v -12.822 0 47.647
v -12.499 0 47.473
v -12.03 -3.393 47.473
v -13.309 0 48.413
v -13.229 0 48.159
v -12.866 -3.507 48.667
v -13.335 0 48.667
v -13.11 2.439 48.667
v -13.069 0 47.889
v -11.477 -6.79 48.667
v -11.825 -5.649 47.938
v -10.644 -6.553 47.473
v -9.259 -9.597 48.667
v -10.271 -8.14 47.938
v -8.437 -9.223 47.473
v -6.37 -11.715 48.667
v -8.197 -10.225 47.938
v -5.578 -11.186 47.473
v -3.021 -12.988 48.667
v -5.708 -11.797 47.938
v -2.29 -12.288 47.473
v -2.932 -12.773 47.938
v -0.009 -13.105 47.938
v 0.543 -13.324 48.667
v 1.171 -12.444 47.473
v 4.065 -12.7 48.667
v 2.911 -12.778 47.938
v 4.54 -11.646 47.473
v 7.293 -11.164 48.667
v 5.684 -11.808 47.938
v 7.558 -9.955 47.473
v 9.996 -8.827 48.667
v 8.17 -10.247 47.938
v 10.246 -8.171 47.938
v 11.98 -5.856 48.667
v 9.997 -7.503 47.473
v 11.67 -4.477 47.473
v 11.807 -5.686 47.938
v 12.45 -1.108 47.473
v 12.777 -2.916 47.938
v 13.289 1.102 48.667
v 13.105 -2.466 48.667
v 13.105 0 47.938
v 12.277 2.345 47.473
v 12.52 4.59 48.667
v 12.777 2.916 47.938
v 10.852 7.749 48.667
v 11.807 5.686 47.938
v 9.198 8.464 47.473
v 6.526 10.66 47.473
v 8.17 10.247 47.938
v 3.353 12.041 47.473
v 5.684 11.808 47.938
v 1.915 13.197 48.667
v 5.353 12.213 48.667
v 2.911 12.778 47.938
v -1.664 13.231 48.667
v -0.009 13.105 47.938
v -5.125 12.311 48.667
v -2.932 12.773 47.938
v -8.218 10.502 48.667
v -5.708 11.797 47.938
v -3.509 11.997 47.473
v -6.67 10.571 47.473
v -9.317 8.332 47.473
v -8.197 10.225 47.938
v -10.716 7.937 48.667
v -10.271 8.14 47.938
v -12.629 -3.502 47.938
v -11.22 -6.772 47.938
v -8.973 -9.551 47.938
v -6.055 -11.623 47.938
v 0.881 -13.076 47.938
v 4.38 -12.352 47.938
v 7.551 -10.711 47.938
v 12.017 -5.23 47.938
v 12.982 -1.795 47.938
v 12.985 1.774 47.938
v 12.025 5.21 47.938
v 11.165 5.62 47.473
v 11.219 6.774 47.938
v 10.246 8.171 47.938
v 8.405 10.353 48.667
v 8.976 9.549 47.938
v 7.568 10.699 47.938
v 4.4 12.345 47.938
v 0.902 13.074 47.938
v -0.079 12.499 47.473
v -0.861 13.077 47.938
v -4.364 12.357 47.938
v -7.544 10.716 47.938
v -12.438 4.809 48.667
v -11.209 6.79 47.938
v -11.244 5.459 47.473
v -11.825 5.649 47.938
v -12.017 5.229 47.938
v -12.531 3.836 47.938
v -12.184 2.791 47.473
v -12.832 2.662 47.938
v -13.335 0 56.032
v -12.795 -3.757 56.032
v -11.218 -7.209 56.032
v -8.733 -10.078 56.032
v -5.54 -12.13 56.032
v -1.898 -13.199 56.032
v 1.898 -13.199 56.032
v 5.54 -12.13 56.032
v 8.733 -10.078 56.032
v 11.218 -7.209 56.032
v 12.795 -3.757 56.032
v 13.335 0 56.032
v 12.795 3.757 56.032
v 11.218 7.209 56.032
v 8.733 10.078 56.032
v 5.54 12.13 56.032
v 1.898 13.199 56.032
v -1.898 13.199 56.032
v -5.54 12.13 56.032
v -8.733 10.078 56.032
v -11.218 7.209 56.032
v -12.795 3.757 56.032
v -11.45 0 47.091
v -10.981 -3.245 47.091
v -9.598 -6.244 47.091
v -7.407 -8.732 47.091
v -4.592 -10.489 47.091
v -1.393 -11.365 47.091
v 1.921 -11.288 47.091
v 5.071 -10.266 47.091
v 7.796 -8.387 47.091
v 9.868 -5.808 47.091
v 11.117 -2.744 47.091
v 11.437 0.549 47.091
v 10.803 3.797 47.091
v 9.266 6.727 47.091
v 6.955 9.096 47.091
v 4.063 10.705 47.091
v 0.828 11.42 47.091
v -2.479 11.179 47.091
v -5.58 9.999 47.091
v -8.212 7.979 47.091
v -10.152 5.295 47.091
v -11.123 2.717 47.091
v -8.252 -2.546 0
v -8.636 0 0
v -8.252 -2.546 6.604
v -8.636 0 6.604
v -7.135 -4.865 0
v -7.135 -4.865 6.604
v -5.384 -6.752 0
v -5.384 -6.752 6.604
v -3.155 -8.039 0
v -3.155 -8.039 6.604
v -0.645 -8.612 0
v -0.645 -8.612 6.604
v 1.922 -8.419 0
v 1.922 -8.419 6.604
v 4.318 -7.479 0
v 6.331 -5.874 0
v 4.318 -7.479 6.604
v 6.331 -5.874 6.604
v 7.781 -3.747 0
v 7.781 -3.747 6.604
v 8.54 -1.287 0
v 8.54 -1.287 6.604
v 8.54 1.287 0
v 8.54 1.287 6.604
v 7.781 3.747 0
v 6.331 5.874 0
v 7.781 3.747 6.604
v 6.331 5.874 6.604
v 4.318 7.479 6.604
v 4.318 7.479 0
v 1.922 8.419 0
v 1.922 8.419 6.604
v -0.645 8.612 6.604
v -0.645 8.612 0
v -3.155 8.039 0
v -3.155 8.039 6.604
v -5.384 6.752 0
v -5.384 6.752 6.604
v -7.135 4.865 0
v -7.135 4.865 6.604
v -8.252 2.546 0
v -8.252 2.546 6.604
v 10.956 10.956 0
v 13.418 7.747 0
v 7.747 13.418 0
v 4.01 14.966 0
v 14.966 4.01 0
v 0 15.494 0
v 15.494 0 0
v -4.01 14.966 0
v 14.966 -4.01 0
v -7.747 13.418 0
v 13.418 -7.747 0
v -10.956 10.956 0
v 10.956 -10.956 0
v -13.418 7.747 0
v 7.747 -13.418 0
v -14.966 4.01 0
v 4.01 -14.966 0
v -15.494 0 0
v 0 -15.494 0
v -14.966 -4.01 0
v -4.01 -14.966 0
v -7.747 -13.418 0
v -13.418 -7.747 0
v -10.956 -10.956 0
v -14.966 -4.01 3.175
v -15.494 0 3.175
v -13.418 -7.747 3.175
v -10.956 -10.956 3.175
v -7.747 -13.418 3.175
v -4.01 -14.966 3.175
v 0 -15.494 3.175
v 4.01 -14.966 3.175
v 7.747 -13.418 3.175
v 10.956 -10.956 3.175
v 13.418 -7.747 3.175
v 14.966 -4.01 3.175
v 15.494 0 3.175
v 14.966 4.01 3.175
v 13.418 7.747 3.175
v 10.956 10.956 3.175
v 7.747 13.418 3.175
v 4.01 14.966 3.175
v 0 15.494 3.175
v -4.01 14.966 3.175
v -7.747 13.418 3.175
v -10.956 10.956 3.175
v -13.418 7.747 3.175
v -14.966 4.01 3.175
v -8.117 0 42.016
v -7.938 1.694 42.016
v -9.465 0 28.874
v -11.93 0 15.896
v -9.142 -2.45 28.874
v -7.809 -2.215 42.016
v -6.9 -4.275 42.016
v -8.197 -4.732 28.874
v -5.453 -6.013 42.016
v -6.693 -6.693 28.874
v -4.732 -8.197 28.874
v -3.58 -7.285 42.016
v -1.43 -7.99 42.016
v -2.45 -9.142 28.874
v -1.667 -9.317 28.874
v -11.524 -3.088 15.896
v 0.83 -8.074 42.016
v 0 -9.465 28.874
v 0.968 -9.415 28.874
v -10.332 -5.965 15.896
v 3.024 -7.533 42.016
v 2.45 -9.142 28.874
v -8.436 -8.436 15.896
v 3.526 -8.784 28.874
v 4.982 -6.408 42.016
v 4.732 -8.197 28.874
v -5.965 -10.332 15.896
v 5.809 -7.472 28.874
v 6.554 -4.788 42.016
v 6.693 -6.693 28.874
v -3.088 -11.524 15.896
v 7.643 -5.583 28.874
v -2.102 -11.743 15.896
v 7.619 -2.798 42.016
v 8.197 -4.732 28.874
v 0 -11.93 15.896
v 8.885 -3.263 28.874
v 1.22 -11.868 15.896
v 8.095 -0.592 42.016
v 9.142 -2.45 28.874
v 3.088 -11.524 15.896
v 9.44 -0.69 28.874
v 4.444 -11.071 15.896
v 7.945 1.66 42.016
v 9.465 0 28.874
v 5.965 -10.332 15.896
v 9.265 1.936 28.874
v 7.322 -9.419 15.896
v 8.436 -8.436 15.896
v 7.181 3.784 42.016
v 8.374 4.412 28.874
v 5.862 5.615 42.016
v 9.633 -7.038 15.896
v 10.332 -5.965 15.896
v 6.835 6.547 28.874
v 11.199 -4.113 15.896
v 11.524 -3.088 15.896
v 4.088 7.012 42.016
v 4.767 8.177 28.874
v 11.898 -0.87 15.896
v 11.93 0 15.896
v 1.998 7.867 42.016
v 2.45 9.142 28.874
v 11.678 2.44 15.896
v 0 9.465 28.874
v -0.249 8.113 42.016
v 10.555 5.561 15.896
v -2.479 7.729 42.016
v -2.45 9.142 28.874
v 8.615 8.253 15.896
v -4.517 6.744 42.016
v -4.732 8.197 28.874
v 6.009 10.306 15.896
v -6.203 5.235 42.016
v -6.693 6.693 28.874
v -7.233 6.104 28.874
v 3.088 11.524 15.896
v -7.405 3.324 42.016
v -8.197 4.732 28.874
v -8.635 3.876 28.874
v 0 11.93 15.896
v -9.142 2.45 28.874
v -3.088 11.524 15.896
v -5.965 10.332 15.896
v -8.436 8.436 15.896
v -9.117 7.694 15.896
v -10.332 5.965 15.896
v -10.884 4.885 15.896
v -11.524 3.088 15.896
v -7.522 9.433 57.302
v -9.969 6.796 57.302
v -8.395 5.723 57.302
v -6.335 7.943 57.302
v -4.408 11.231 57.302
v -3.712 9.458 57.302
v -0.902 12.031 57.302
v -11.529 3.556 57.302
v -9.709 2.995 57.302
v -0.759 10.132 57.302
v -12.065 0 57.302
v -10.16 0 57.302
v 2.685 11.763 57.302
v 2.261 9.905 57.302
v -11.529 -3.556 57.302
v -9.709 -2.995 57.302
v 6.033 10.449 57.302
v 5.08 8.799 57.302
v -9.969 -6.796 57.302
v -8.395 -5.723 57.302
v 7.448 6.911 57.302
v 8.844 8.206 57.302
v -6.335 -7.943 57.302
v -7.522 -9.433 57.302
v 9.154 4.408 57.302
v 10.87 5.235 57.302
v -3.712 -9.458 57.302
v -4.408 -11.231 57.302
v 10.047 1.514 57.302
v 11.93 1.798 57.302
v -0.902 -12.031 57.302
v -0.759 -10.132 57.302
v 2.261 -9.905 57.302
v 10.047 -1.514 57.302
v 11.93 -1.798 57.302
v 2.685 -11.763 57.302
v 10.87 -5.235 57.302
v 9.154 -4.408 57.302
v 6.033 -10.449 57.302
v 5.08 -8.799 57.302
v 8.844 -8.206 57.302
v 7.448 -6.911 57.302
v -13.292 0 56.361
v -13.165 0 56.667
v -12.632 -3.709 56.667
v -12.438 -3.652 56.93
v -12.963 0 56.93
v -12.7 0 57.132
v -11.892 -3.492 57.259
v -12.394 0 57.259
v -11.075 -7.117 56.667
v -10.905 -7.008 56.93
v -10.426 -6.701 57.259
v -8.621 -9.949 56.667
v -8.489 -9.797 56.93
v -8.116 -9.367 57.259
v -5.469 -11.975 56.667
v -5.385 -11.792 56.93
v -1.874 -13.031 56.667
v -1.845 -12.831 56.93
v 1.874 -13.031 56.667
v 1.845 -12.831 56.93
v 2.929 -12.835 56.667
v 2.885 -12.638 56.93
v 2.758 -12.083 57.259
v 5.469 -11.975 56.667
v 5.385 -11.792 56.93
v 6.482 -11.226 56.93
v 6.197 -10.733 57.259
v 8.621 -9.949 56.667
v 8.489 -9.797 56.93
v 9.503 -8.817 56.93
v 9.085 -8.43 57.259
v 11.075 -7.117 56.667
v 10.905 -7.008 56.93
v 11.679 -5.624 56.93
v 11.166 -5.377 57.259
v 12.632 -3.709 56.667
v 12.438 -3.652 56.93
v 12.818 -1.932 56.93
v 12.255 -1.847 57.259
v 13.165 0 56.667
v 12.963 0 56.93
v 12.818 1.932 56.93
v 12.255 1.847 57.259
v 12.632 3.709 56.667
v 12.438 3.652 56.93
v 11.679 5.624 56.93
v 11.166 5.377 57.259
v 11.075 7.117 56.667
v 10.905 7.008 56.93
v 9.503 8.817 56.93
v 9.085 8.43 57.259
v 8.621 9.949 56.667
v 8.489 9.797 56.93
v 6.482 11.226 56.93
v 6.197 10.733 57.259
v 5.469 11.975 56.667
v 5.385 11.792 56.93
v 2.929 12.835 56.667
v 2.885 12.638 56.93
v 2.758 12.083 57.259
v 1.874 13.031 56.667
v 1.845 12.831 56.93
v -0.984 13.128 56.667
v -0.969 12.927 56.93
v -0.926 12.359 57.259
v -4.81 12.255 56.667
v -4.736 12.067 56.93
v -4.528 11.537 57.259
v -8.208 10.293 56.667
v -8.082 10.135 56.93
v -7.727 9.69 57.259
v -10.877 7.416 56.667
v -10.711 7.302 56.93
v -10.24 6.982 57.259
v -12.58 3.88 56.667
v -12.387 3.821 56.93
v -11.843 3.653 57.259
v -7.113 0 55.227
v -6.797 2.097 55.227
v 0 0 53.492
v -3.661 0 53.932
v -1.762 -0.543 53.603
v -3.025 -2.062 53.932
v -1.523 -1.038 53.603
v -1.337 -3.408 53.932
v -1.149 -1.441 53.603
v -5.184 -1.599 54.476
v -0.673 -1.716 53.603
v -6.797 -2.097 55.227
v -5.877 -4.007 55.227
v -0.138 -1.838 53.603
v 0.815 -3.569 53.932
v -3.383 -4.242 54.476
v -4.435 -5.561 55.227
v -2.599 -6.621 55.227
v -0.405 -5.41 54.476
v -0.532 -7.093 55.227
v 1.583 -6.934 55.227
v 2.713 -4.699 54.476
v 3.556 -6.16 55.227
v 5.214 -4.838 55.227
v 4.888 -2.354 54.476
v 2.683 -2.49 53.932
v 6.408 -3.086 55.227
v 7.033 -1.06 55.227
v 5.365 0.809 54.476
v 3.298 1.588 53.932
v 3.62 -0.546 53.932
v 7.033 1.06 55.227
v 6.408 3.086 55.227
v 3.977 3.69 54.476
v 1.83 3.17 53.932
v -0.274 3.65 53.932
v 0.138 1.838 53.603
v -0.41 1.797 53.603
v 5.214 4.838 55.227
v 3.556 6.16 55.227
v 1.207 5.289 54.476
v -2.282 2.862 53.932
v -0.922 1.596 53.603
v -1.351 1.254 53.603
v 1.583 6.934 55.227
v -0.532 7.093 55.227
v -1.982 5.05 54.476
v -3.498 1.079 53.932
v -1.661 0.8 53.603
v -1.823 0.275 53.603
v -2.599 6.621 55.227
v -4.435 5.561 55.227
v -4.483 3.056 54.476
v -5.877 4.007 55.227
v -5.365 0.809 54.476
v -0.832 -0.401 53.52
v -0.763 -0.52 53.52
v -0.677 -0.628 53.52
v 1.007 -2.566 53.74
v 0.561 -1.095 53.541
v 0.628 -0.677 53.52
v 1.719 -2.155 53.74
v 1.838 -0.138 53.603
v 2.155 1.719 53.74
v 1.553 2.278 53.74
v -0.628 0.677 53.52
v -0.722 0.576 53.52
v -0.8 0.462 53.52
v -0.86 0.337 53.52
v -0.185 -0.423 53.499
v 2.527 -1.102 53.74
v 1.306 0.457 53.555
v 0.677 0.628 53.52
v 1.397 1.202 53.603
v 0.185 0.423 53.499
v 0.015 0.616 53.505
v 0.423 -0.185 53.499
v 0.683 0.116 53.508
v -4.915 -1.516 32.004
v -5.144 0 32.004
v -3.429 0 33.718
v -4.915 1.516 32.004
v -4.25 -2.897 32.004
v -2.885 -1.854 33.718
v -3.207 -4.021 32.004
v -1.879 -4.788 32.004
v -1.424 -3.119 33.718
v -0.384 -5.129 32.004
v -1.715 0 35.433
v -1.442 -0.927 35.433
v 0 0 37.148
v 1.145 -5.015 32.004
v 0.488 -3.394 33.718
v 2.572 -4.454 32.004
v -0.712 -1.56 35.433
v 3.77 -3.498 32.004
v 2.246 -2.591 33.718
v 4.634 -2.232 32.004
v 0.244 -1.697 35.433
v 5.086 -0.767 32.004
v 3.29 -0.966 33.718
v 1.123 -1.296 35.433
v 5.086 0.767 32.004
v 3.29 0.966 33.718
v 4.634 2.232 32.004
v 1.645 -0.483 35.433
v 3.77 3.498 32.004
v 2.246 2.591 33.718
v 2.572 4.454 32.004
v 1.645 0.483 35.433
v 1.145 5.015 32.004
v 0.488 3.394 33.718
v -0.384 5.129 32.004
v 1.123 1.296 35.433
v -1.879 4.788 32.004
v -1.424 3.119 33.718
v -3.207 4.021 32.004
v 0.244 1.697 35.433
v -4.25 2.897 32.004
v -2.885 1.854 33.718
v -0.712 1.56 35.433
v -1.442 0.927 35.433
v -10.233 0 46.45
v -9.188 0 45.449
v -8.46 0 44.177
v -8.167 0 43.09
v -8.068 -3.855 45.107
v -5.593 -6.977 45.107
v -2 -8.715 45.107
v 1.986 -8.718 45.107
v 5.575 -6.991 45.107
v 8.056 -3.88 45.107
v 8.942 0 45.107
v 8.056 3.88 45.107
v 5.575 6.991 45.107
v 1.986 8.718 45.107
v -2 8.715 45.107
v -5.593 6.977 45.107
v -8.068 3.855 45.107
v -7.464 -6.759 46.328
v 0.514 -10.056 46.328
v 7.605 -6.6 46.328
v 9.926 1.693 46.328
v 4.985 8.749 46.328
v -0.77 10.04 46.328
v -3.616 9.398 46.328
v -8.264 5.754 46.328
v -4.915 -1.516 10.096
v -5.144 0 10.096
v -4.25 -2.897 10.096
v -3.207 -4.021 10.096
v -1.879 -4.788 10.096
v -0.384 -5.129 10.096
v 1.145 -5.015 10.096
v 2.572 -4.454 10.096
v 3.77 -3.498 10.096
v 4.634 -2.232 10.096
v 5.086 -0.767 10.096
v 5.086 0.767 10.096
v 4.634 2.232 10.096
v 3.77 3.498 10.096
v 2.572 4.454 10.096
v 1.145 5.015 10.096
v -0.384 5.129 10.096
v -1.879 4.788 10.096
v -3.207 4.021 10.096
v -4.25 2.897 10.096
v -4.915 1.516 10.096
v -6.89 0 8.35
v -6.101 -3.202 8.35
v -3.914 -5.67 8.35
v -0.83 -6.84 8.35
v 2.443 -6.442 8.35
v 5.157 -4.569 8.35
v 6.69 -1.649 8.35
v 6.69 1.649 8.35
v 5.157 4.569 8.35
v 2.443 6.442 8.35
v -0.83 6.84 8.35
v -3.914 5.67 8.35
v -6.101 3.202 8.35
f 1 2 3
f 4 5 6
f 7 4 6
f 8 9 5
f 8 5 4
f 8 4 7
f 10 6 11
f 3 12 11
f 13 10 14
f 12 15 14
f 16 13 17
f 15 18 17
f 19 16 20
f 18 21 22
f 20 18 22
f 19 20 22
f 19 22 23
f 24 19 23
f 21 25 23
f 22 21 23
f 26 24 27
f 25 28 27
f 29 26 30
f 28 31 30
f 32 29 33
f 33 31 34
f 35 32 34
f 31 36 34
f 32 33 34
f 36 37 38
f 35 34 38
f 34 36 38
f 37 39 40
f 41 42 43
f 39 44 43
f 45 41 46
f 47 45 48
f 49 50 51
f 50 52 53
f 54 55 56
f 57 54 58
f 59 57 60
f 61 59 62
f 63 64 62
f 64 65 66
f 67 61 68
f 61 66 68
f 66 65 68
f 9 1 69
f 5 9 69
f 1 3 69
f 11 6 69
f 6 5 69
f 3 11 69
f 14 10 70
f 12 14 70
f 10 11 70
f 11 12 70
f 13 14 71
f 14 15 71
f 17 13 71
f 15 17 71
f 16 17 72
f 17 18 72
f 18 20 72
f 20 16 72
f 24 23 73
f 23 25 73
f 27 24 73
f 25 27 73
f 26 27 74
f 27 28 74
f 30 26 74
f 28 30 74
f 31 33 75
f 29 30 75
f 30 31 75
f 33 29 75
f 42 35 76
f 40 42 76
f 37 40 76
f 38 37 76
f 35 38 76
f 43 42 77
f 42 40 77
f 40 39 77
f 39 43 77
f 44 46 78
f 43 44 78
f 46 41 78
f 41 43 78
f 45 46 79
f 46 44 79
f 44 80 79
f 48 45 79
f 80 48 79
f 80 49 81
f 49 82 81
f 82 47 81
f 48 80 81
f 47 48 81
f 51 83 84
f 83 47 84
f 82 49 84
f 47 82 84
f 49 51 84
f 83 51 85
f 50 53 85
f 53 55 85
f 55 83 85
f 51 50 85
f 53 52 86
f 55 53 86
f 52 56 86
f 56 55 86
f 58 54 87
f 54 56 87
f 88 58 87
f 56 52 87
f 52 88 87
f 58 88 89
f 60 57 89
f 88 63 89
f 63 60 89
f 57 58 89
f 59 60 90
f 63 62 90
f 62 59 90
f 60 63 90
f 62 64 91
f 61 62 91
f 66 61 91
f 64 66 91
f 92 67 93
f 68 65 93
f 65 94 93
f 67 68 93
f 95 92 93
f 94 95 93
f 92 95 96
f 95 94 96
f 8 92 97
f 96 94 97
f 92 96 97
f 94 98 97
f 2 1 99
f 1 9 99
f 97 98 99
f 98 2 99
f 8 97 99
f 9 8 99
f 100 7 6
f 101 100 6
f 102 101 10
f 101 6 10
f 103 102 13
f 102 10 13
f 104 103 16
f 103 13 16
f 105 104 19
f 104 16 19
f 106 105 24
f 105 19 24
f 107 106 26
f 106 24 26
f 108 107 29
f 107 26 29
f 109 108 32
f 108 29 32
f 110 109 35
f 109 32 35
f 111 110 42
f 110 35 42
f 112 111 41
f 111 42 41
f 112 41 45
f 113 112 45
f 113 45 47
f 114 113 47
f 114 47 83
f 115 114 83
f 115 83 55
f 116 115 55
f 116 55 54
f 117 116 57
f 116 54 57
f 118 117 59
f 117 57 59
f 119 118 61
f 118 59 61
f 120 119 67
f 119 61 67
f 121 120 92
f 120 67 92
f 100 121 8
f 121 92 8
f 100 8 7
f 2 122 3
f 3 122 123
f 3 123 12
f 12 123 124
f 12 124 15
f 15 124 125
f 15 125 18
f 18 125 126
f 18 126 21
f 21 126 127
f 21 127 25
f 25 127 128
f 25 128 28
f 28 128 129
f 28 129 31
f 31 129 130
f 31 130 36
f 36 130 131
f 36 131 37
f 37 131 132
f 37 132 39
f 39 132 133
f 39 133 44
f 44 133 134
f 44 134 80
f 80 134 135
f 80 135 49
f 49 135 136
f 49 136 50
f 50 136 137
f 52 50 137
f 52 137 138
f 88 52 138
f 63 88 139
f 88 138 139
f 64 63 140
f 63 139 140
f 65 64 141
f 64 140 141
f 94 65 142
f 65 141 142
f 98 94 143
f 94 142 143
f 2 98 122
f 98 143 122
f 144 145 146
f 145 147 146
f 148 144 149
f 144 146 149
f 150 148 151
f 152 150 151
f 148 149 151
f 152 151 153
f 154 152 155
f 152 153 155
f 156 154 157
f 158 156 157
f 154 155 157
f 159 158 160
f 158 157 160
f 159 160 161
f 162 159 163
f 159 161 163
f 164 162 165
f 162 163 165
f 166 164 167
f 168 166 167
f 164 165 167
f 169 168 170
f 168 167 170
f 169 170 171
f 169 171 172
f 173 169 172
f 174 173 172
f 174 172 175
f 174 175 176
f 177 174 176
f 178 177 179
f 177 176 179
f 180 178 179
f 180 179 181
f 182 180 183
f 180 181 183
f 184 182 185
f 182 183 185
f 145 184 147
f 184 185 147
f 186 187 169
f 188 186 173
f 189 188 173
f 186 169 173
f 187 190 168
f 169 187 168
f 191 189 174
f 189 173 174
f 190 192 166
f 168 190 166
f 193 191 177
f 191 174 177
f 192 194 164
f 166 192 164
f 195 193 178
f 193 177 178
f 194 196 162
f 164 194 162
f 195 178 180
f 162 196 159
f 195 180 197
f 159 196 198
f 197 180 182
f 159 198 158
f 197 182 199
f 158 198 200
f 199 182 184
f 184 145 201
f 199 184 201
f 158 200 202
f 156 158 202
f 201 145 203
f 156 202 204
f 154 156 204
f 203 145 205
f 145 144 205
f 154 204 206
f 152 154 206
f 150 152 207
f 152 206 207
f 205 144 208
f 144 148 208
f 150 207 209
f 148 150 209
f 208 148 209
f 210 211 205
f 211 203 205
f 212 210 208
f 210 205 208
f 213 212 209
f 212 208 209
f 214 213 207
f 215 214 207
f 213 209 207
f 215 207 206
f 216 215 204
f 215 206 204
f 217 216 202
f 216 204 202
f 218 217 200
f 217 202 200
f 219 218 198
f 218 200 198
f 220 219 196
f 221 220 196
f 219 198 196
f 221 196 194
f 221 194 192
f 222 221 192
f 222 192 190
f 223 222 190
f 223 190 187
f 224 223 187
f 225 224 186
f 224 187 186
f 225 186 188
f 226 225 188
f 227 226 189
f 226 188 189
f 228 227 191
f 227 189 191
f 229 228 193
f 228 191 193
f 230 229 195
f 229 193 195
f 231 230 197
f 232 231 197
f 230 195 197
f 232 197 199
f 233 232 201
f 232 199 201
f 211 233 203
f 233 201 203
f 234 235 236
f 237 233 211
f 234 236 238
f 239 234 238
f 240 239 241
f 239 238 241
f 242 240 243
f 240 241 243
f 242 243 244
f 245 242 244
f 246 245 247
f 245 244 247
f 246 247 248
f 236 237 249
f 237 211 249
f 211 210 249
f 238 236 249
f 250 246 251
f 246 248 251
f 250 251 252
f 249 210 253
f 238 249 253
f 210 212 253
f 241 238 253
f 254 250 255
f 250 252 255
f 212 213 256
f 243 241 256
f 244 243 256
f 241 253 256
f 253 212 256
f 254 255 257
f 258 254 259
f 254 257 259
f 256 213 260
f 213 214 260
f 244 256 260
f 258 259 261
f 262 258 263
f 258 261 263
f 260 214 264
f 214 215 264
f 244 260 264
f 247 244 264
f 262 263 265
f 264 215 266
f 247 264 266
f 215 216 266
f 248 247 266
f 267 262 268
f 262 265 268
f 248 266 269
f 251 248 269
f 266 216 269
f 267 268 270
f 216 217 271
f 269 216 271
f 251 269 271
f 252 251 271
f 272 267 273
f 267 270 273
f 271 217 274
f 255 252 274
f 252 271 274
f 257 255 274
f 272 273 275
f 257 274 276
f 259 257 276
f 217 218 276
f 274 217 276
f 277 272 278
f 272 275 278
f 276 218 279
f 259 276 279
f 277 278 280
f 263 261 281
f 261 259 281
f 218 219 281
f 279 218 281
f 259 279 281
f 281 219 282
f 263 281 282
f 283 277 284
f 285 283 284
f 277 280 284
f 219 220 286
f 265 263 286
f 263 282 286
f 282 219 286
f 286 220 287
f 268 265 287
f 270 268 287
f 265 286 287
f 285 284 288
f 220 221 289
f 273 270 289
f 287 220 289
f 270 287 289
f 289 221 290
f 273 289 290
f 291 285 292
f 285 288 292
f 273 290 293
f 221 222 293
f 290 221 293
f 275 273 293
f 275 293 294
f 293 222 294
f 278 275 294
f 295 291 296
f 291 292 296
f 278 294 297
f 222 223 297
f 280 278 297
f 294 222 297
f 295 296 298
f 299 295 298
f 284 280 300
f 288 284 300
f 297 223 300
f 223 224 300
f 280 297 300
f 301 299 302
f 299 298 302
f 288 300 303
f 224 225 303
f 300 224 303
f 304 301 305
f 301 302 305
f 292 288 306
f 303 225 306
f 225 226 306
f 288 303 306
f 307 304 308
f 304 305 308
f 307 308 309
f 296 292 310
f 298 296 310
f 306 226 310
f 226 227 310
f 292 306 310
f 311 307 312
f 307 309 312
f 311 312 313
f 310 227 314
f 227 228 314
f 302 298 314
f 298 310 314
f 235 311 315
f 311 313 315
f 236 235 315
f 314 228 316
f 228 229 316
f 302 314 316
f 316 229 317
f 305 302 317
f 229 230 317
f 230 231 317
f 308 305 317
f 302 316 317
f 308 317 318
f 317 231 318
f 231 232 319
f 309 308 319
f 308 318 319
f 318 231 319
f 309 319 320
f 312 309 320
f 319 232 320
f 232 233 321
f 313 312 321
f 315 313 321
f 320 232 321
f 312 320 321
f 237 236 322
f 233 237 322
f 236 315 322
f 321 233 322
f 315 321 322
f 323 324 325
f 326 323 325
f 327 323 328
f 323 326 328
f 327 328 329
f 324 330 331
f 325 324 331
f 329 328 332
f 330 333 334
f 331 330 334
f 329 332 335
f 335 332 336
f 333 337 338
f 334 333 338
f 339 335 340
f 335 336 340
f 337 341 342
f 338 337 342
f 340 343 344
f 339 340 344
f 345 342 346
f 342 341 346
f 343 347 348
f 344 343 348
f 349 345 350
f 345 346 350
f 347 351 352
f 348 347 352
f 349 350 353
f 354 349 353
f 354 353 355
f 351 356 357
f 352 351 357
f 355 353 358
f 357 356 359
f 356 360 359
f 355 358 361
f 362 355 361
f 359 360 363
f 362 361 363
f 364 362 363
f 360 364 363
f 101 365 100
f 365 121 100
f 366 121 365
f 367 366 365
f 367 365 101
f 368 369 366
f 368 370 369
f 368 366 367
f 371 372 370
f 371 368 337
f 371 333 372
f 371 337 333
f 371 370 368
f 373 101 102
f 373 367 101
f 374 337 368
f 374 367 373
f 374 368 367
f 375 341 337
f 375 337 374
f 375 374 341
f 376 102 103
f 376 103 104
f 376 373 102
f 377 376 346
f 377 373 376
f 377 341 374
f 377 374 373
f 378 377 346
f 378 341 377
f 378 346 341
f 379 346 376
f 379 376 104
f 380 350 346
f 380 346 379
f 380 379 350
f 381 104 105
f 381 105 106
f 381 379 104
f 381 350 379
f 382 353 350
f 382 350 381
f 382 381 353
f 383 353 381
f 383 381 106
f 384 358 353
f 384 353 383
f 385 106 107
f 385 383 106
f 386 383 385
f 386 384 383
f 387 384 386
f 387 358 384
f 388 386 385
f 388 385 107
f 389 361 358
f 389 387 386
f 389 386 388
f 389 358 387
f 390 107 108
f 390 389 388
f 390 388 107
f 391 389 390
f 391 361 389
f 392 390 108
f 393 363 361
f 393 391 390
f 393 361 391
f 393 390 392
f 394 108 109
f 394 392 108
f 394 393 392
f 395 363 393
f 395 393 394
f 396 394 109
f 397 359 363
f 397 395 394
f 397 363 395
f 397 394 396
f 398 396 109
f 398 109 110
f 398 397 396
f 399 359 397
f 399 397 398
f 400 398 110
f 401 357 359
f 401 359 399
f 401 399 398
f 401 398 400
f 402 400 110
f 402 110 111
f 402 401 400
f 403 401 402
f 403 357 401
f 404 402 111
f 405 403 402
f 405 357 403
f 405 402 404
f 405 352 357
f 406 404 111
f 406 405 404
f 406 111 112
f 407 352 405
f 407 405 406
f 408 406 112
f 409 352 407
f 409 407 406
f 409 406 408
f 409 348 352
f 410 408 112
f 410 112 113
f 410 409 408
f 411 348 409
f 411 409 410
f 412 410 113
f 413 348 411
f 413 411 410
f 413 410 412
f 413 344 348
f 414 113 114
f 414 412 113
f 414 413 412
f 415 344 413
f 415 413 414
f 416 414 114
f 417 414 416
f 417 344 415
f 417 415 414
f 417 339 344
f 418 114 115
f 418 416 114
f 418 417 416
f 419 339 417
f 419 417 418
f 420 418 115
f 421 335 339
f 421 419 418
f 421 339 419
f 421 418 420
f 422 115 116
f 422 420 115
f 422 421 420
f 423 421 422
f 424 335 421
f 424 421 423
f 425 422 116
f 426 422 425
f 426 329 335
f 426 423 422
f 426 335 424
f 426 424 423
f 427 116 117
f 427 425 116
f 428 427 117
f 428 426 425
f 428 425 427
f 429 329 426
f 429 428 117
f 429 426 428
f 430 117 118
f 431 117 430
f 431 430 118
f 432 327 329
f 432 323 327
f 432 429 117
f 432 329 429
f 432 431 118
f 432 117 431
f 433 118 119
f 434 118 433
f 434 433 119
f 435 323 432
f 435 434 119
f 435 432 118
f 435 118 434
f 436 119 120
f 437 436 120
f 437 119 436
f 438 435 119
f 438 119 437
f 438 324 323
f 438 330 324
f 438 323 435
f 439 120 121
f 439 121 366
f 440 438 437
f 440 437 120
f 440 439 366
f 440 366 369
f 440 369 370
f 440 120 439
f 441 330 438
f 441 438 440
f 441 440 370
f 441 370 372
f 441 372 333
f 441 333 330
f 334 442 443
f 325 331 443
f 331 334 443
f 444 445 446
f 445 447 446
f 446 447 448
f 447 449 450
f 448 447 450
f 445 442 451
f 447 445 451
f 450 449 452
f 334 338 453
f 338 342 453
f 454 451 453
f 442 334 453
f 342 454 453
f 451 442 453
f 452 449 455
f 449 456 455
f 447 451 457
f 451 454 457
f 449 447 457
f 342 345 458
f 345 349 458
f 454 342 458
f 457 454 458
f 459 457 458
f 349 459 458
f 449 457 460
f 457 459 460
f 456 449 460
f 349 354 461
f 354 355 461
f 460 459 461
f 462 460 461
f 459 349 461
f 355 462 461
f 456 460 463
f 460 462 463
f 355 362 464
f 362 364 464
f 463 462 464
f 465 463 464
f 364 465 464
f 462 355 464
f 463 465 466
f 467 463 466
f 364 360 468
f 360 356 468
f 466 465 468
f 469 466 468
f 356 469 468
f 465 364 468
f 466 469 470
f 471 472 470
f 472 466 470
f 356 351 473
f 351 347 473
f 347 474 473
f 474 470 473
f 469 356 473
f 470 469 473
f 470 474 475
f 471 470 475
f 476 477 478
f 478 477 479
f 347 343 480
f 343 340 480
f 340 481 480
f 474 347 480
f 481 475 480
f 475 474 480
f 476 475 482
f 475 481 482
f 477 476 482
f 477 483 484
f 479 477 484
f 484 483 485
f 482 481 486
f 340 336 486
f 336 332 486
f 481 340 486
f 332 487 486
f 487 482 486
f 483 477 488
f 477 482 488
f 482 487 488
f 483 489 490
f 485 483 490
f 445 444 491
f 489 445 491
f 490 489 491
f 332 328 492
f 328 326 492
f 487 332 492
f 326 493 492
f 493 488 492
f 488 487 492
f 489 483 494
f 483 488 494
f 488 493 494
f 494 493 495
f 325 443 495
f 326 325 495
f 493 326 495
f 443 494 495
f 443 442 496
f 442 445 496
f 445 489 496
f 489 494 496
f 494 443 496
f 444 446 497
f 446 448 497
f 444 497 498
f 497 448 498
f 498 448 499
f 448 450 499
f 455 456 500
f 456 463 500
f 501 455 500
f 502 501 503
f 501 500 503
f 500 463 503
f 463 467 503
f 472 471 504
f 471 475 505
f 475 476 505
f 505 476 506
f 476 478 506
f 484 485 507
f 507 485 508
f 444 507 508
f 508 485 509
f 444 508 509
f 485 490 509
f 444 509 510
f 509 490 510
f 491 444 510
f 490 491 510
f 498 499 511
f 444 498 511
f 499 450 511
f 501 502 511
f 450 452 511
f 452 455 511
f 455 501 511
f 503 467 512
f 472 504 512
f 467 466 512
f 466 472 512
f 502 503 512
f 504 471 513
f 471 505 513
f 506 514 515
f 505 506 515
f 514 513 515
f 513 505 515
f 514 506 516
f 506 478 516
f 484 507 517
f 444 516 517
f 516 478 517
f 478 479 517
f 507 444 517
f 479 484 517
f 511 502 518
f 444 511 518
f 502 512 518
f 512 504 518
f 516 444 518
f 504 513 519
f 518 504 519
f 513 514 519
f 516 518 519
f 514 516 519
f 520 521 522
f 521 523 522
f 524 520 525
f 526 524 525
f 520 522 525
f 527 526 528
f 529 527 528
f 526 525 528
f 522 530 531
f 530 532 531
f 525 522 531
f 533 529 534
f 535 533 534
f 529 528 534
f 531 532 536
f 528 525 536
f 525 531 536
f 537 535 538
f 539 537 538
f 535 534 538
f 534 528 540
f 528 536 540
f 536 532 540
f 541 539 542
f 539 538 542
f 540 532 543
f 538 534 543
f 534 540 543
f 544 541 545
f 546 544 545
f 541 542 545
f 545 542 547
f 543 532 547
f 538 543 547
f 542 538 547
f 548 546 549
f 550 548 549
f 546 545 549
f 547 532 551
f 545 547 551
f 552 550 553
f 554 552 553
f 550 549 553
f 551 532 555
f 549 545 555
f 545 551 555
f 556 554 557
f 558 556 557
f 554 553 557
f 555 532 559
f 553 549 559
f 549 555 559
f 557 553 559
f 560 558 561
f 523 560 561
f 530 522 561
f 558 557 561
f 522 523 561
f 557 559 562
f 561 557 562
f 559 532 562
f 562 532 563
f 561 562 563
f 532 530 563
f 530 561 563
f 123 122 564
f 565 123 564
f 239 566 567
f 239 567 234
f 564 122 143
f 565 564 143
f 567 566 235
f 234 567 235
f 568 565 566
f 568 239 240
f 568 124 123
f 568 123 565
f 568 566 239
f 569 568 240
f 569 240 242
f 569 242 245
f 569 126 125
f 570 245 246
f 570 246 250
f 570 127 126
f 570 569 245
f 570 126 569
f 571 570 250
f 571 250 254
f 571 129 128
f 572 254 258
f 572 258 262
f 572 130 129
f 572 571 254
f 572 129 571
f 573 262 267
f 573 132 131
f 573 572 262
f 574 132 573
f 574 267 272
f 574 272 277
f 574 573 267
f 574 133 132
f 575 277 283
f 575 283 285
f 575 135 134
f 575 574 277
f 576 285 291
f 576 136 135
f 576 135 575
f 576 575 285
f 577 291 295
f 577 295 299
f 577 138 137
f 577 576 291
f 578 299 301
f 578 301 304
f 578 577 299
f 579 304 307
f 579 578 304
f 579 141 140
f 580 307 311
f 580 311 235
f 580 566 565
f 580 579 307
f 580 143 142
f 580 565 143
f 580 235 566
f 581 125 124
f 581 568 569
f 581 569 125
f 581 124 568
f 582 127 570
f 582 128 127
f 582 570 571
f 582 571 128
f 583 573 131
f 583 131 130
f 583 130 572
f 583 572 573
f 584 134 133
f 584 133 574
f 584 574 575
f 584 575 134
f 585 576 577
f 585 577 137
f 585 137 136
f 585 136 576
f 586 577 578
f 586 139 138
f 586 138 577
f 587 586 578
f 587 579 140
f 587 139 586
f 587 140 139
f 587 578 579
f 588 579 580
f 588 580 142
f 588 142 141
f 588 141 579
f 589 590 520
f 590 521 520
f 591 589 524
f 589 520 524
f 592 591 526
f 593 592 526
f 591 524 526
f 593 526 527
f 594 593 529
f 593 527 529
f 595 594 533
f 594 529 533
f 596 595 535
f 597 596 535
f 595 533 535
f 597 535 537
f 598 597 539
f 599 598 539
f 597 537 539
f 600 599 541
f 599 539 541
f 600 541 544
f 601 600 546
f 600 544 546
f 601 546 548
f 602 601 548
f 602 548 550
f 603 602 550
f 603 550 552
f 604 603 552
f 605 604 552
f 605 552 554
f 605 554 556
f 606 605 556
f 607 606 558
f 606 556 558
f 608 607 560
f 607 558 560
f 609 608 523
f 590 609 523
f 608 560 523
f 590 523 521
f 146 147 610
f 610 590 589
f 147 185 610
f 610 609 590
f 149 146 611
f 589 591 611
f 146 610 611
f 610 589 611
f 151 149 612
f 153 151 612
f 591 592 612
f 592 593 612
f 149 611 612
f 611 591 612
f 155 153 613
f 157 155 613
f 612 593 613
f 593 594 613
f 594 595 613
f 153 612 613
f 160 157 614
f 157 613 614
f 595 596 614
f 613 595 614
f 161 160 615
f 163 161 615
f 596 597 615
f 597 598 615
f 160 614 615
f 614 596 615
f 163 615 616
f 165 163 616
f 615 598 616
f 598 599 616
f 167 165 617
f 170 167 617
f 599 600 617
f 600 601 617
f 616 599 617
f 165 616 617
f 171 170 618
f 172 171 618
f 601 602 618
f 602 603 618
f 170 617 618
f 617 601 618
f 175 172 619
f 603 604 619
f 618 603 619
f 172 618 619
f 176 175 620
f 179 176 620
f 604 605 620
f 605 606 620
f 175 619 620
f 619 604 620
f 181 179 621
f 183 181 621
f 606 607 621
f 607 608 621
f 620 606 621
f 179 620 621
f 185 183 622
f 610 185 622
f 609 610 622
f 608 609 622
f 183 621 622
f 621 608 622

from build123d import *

# Parameters (mm, degrees)
F2_R = 5.08
F3_R = 1.27


with BuildPart() as f1:
    # F0 (on Front) → F1 (revolve)
    with BuildSketch(Plane.XZ):
        with BuildLine():
            Line((-15.494, 0), (-8.636, 0))
            Line((-8.636, 0), (-8.636, 6.604))
            Line((-8.636, 6.604), (-5.1435, 10.0965))
            Line((-5.1435, 10.0965), (-5.1435, 32.004))
            Line((-5.1435, 32.004), (0, 37.1475))
            Line((0, 37.1475), (0, 53.4924))
            ThreePointArc((0, 53.4924), (-5.425442, 54.47622), (-10.16, 57.3024))
            Line((-10.16, 57.3024), (-13.335, 57.3024))
            Line((-13.335, 57.3024), (-13.335, 47.7774))
            Line((-13.335, 47.7774), (-7.9375, 45.812871))
            ThreePointArc((-7.9375, 45.812871), (-10.215656, 24.228081), (-15.494, 3.175))
            Line((-15.494, 3.175), (-15.494, 0))
        make_face()
    revolve(axis=Axis((0, 0, 48.82799), (0, 0, 1)))

    # F2
    f2_edges = [f1.edges().sort_by_distance(p)[0] for p in [
        (7.9375, 0, 45.812871),
    ]]
    fillet(f2_edges, radius=F2_R)

    # F3
    f3_edges = [f1.edges().sort_by_distance(p)[0] for p in [
        (13.335, 0, 47.7774),
        (13.335, 0, 57.3024),
    ]]
    fillet(f3_edges, radius=F3_R)


solid = f1.part
